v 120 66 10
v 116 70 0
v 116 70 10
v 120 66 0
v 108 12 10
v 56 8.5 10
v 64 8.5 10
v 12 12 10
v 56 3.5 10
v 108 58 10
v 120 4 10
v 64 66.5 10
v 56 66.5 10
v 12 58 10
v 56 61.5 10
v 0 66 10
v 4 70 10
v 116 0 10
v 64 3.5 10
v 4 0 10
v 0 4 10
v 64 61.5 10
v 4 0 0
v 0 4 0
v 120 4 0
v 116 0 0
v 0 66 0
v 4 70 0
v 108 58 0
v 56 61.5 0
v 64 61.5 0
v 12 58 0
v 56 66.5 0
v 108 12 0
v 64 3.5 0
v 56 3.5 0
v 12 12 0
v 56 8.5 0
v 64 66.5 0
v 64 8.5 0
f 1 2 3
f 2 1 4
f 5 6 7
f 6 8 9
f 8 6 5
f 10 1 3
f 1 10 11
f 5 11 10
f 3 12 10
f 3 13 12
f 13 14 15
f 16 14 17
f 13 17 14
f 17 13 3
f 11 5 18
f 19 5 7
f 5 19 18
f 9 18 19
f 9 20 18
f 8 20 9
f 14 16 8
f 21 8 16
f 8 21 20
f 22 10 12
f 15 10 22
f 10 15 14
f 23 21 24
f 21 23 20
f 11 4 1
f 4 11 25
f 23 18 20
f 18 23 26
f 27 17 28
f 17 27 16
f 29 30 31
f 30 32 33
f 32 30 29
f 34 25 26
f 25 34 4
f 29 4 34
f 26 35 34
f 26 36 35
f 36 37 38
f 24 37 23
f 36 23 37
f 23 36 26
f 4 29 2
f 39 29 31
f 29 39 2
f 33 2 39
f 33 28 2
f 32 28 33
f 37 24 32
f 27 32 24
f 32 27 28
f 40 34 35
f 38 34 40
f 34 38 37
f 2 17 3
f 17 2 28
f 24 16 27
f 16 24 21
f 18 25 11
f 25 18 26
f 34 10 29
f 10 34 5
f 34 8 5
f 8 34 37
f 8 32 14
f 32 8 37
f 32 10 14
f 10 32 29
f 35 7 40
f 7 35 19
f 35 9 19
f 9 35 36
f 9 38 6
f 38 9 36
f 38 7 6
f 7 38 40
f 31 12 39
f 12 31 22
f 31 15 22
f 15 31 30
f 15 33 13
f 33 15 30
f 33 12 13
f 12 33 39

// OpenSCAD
$fn = 32;

// ----------------------------------------------------------------------
// Frame plate: 120 x 70 frame, 12 mm rails
// ----------------------------------------------------------------------

// --- parameters (mm) ---
plate_l = 120;            // plate length, X
plate_w = 70;             // plate width, Y
plate_t = 10;             // plate thickness, Z (extrusion height)
corner_c = 4;             // corner chamfer
frame_bar = 12;           // frame rail width
slot_l = 8;               // adjustment slot length
slot_w = 5;               // adjustment slot width

win_l = plate_l - 2 * frame_bar;  // window length
win_w = plate_w - 2 * frame_bar;  // window width

profile = [[4, 0], [116, 0], [120, 4], [120, 66], [116, 70], [4, 70], [0, 66], [0, 4]];  // primary outline, 8 points, counter clockwise
void_1 = [[12, 12], [108, 12], [108, 58], [12, 58]];  // the window, 4 points
void_2 = [[56, 3.5], [64, 3.5], [64, 8.5], [56, 8.5]];  // adjustment slot, 4 points
void_3 = [[56, 61.5], [64, 61.5], [64, 66.5], [56, 66.5]];  // adjustment slot, 4 points

// --- the one profile operation ---
difference() {
  linear_extrude(height = plate_t) polygon(points = profile);
  translate([0, 0, -1])
    linear_extrude(height = plate_t + 2) polygon(points = void_1);
  translate([0, 0, -1])
    linear_extrude(height = plate_t + 2) polygon(points = void_2);
  translate([0, 0, -1])
    linear_extrude(height = plate_t + 2) polygon(points = void_3);
}
